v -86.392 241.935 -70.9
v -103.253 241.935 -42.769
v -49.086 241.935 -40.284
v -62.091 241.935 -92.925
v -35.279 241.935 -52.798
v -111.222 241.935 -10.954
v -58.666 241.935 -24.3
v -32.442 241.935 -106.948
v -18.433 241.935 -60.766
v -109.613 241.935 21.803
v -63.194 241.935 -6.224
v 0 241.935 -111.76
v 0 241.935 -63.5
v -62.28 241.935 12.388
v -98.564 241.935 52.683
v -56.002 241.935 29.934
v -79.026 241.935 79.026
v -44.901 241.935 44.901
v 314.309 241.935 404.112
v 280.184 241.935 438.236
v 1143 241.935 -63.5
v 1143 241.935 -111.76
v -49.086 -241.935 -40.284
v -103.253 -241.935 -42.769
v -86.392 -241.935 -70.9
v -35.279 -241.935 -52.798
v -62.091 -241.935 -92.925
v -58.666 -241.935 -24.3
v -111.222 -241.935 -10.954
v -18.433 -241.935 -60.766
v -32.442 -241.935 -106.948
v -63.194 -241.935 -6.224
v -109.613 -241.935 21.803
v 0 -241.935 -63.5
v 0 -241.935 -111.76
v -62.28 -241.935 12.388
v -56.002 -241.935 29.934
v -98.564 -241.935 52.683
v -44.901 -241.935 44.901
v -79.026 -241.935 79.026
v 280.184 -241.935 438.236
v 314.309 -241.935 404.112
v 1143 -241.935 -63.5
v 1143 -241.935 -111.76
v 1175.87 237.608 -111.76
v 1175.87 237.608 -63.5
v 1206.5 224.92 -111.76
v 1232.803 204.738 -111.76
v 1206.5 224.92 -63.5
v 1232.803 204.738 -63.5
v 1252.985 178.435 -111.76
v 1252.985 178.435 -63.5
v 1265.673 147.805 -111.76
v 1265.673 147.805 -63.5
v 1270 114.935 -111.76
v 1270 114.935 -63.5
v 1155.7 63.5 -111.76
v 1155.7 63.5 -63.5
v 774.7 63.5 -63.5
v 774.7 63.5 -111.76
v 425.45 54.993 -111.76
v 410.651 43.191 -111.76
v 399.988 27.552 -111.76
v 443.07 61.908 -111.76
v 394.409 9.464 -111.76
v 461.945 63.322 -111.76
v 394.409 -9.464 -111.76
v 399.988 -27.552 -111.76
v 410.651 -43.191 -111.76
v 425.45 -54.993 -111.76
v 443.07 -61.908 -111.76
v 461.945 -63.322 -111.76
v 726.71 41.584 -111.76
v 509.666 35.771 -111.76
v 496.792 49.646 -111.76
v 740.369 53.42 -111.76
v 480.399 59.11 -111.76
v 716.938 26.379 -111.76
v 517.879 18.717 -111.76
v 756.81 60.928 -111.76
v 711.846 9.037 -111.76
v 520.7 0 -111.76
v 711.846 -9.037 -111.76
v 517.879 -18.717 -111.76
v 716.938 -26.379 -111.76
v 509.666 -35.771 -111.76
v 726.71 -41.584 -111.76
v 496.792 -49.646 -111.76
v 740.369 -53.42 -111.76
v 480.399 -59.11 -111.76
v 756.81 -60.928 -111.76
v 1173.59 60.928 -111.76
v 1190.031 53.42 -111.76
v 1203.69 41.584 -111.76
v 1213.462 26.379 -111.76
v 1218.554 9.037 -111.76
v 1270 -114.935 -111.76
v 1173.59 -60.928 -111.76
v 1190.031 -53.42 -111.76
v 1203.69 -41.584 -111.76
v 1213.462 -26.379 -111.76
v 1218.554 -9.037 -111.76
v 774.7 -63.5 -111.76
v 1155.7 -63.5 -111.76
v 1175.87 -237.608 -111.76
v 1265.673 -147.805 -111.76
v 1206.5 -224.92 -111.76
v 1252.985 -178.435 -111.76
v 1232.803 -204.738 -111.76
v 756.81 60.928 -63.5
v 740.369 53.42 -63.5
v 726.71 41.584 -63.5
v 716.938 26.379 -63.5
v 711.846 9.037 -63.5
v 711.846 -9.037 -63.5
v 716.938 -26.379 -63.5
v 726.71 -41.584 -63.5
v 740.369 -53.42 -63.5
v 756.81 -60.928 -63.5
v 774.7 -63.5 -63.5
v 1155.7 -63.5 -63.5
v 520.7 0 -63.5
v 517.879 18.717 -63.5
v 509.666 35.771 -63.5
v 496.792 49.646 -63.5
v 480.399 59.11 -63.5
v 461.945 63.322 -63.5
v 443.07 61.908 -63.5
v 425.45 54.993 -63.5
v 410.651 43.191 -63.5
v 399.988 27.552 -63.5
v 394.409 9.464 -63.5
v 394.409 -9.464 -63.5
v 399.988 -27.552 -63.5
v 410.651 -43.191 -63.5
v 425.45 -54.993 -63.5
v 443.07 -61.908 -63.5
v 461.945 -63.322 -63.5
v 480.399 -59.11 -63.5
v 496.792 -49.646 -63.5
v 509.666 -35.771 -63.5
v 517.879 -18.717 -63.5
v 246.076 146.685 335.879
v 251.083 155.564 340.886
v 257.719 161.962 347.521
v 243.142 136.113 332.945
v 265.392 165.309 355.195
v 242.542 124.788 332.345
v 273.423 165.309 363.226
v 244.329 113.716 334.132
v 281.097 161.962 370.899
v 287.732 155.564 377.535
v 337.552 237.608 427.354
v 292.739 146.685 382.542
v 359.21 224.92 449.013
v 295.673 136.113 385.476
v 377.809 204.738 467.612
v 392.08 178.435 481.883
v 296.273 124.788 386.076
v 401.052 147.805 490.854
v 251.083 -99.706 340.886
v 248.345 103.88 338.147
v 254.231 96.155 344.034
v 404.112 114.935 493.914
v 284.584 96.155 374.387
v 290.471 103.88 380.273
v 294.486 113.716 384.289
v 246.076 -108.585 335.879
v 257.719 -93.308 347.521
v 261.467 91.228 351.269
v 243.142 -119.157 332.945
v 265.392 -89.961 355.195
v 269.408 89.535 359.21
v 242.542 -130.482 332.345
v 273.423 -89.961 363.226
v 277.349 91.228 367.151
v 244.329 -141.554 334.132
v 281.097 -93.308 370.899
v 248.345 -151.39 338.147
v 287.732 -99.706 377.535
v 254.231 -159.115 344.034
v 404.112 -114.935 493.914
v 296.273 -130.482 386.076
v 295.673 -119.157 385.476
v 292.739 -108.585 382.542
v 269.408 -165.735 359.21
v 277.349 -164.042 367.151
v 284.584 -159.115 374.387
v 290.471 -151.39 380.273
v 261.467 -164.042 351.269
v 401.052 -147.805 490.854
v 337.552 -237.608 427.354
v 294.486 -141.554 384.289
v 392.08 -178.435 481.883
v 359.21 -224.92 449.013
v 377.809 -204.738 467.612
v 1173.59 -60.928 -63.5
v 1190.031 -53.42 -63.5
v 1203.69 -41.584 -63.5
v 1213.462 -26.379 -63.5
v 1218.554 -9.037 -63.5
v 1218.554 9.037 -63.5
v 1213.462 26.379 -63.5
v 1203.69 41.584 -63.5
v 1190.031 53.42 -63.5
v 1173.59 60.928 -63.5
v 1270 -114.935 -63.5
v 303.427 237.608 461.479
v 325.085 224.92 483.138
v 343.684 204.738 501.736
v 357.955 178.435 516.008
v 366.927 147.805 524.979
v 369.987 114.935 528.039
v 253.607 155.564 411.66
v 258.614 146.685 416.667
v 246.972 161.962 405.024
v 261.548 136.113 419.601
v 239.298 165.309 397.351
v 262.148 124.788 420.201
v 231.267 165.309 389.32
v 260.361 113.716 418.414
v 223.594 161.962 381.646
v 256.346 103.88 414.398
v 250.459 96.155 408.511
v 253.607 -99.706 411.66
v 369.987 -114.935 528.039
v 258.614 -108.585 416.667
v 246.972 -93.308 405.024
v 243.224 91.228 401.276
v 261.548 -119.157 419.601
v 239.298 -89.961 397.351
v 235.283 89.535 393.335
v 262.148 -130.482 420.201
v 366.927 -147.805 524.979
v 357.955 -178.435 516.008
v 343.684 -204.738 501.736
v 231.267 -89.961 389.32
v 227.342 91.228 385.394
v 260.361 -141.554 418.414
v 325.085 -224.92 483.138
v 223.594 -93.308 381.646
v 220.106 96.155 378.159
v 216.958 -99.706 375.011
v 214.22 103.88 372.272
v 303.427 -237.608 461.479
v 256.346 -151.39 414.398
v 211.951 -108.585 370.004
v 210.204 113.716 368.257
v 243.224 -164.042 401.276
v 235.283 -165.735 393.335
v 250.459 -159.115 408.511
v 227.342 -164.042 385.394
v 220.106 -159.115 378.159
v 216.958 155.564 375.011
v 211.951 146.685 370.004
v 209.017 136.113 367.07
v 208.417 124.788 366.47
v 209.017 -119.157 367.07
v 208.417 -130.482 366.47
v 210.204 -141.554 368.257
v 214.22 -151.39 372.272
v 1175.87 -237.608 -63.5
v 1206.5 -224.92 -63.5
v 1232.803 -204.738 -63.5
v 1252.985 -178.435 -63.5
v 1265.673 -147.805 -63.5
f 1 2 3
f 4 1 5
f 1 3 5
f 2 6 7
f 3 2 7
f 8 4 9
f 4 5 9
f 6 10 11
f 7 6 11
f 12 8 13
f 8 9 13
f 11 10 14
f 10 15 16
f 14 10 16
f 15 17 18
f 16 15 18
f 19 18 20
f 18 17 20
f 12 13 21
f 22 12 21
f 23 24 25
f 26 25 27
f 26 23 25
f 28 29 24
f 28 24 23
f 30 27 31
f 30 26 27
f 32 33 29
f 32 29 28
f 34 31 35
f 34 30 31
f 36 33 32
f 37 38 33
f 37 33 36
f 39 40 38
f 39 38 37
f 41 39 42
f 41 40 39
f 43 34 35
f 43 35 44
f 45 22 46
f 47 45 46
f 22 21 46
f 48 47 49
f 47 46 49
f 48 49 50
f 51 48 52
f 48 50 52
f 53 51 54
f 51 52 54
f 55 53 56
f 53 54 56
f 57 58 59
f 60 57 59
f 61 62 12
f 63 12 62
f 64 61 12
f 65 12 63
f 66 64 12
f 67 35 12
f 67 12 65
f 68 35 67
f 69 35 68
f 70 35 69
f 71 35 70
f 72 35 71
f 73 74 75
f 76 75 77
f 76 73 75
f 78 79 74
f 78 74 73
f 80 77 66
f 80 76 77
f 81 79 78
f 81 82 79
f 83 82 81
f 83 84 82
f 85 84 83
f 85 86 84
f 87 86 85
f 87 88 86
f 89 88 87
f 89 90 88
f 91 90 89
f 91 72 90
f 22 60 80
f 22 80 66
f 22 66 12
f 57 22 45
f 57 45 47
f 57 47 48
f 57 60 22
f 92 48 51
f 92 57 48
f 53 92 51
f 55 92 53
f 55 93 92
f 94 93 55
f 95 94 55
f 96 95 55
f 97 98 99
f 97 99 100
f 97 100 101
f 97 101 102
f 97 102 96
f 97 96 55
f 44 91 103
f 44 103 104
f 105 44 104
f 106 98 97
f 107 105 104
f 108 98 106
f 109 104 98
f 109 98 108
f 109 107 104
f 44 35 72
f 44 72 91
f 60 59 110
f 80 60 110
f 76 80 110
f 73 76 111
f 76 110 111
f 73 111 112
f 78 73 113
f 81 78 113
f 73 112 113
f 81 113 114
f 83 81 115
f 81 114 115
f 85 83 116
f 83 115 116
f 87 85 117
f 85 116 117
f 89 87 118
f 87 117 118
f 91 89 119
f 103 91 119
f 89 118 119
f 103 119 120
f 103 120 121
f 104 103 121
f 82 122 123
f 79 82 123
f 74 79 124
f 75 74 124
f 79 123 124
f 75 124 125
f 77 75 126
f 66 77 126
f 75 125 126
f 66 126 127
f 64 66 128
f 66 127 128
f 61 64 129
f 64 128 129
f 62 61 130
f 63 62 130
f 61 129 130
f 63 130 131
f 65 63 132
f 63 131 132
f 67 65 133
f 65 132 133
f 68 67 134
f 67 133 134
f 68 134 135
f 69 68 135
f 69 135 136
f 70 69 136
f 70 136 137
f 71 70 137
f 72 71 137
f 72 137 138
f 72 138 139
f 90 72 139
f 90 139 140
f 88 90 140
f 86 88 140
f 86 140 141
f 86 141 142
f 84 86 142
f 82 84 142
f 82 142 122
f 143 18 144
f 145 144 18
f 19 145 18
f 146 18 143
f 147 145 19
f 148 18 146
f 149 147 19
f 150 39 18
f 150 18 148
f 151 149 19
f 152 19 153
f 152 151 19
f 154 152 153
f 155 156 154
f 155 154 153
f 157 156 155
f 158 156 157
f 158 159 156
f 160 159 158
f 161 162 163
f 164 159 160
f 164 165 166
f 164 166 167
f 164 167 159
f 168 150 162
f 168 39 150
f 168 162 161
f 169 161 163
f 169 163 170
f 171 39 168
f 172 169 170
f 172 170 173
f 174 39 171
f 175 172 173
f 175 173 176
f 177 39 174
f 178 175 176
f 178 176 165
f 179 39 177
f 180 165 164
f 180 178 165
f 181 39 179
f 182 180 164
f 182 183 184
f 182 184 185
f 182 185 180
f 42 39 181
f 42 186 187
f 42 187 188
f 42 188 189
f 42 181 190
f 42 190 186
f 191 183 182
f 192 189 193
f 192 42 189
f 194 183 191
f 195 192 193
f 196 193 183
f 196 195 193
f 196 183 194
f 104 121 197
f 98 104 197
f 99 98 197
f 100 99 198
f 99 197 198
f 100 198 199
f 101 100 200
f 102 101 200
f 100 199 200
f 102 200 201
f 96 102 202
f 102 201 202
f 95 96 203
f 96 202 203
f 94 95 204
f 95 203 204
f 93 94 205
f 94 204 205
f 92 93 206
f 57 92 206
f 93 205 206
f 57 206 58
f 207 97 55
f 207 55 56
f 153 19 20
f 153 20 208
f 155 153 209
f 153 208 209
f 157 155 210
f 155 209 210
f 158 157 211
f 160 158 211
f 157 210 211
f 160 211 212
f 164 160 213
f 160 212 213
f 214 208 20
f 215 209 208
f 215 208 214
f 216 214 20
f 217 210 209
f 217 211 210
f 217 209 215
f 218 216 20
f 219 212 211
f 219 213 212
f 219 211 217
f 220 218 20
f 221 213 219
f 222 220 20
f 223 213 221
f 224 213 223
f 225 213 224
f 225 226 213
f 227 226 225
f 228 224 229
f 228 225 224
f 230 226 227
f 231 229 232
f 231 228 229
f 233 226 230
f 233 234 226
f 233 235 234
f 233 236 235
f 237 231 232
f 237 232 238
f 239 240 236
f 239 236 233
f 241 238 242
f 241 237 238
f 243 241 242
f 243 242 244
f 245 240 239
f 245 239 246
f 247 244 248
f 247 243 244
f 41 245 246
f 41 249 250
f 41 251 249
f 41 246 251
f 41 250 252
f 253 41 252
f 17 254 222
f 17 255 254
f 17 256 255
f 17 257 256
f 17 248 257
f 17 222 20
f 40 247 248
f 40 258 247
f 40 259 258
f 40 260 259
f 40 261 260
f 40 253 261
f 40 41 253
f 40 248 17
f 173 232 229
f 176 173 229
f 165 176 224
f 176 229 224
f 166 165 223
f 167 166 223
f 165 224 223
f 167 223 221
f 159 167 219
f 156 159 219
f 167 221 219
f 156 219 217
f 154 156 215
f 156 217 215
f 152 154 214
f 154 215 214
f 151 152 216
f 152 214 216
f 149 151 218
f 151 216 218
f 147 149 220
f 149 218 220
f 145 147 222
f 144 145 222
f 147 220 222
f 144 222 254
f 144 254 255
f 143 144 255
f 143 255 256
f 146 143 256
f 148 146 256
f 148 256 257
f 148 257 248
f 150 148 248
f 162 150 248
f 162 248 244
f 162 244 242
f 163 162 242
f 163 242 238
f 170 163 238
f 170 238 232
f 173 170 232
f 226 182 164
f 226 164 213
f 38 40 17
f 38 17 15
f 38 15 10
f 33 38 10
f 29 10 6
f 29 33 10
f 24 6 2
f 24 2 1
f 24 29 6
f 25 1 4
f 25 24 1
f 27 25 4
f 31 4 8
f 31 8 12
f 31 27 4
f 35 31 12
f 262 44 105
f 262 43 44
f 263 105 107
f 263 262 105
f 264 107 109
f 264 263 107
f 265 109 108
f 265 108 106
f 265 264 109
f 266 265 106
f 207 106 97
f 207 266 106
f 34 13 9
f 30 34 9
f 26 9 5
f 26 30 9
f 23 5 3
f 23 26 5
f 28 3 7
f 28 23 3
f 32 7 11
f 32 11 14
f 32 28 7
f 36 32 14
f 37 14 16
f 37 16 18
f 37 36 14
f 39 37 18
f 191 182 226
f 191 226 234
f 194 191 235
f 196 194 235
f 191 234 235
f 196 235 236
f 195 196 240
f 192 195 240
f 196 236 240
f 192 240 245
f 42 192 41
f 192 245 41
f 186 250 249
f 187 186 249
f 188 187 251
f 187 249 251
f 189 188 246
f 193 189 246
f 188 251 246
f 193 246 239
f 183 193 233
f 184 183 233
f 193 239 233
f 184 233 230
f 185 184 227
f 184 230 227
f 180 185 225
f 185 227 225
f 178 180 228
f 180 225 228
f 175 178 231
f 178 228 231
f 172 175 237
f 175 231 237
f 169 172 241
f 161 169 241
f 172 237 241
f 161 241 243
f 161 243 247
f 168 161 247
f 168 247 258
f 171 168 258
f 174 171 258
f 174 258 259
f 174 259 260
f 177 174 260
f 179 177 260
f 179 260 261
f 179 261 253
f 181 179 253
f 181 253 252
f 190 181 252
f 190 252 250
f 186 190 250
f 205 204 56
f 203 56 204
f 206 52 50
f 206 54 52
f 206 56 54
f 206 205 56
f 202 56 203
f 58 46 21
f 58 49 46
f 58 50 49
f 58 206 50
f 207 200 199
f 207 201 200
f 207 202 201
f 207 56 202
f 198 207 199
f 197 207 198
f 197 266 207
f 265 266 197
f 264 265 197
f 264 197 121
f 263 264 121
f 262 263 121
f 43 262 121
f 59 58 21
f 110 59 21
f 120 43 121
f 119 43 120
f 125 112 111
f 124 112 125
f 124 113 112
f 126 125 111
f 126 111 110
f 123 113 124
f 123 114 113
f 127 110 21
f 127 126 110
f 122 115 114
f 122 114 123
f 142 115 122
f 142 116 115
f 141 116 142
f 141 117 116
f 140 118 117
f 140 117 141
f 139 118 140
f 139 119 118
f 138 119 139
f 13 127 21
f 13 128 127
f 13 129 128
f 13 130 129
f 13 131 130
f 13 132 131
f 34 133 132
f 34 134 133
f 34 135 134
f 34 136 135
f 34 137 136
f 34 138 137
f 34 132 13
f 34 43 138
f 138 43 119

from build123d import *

# Parameters (mm, degrees)
F1_DEPTH = 241.935
F2_R     = 63.5
F3_DEPTH = 48.261
F4_R     = 127
F5_R     = 127
F6_R     = 38.1
F7_DEPTH = 76.2


with BuildPart() as f1:
    # F0 (on Front) → F1 (new body, symmetric)
    with BuildSketch(Plane.XZ):
        with BuildLine():
            Line((369.986552, 528.03906), (-79.026254, 79.026254))
            ThreePointArc((-79.026254, 79.026254), (-103.252777, -42.7687), (0, -111.76))
            Line((0, -111.76), (1270, -111.76))
            Line((1270, -111.76), (1270, -63.5))
            Line((1270, -63.5), (0, -63.5))
            ThreePointArc((0, -63.5), (-58.66635, -24.300398), (-44.901281, 44.901281))
            Line((-44.901281, 44.901281), (404.111525, 493.914087))
            Line((404.111525, 493.914087), (369.986552, 528.03906))
        make_face()
    extrude(amount=F1_DEPTH, both=True)

    # F2 (on face) → F3 (cut, through all)
    with BuildSketch(Plane.XY.offset(-63.5)):
        with Locations((457.2, 0)):
            Circle(F2_R)
        with BuildLine():
            Line((1155.7, 63.5), (774.7, 63.5))
            ThreePointArc((774.7, 63.5), (711.2, 0), (774.7, -63.5))
            Line((774.7, -63.5), (1155.7, -63.5))
            ThreePointArc((1155.7, -63.5), (1219.2, 0), (1155.7, 63.5))
        make_face()
    extrude(amount=-F3_DEPTH, mode=Mode.SUBTRACT)

    # F4
    f4_edges = [f1.edges().sort_by_distance(p)[0] for p in [
        (1270, -241.935, -87.63),
        (1270, 241.935, -87.63),
    ]]
    fillet(f4_edges, radius=F4_R)

    # F5
    f5_edges = [f1.edges().sort_by_distance(p)[0] for p in [
        (387.049039, -241.935, 510.976573),
        (387.049039, 241.935, 510.976573),
    ]]
    fillet(f5_edges, radius=F5_R)

    # F6 (on face) → F7 (cut)
    with BuildSketch(Plane(origin=(-79.026254, 0, 79.026254), x_dir=(0, -1, 0), z_dir=(-0.707107, 0, 0.707107))):
        with Locations((-127.635, 444.5)):
            Circle(F6_R)
        with Locations((127.635, 444.5)):
            Circle(F6_R)
    extrude(amount=-F7_DEPTH, mode=Mode.SUBTRACT)


solid = f1.part
